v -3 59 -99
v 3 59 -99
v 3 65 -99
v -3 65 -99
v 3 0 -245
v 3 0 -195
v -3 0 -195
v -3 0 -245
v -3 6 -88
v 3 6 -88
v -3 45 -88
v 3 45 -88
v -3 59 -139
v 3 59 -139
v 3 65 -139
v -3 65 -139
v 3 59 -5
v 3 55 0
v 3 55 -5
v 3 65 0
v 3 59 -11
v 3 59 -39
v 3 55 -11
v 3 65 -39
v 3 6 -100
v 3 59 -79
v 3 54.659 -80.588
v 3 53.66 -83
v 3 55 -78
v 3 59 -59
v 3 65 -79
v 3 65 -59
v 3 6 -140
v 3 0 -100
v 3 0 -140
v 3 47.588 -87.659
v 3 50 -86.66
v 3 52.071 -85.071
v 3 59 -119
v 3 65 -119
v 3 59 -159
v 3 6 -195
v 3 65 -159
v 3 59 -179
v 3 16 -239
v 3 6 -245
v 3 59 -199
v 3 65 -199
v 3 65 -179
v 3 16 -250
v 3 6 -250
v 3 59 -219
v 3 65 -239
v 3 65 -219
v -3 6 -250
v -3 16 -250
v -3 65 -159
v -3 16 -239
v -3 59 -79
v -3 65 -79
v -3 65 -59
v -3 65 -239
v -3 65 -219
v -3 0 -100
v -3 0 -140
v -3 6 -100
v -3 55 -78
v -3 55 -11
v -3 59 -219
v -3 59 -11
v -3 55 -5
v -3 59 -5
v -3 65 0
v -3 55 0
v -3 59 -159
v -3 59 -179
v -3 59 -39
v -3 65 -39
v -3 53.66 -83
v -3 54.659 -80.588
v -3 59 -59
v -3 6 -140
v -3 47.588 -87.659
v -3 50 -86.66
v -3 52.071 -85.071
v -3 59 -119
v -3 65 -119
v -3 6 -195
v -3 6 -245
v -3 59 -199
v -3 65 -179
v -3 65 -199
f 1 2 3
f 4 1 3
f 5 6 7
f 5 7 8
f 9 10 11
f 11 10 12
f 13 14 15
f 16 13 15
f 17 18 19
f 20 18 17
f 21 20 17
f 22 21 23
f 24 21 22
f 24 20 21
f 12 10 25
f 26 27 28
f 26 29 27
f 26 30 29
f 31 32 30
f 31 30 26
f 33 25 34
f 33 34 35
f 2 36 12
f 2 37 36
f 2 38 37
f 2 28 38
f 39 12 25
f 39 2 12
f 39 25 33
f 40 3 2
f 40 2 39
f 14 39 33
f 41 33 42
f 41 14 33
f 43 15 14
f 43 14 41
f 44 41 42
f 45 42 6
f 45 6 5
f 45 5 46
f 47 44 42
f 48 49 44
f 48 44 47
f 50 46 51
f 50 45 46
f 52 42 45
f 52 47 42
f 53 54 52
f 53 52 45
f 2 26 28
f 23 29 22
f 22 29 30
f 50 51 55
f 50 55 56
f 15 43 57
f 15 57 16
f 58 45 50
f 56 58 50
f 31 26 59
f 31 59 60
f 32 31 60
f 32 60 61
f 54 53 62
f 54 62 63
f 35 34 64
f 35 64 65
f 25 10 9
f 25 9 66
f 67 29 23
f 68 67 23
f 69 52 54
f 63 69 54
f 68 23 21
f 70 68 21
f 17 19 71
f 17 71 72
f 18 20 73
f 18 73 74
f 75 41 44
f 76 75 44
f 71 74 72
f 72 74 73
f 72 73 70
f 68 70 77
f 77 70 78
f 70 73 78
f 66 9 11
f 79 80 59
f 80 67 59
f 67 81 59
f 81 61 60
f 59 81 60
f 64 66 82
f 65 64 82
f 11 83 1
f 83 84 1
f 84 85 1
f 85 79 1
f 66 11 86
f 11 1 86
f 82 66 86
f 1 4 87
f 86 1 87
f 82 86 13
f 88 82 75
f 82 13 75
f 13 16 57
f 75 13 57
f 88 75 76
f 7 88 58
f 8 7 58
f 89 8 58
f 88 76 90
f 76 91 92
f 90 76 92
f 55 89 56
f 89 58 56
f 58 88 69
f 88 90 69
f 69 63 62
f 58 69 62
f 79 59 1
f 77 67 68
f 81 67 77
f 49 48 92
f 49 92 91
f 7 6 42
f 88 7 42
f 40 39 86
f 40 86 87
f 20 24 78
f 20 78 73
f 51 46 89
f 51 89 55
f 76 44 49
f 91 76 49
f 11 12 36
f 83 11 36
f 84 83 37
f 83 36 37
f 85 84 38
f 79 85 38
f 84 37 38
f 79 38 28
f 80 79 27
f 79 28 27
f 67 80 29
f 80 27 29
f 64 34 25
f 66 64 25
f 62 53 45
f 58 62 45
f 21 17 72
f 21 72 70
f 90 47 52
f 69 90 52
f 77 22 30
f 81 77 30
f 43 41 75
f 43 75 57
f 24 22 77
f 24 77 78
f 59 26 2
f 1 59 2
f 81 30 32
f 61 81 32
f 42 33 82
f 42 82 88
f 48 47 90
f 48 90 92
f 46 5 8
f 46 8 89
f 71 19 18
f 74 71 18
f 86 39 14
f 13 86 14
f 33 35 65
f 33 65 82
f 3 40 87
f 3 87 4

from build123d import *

# Parameters (mm, degrees)
BOSS_EXTRUDE1_DEPTH = 3
CUT_EXTRUDE1_DEPTH  = 6
SKETCH4_W           = 12
SKETCH4_H           = 6
SKETCH4_W_2         = 55
SKETCH4_W_3         = 5
SKETCH4_W_4         = 6
SKETCH4_H_2         = 4
CUT_EXTRUDE2_DEPTH  = 6
CUT_EXTRUDE3_REACH  = 8
SKETCH5_W           = 20
SKETCH5_H           = 6


with BuildPart() as part:
    # Sketch1 → Boss-Extrude1 (new body, symmetric)
    with BuildSketch(Plane(origin=(0, 0, 0), x_dir=(0, 0, -1), z_dir=(1, 0, 0))):
        Polygon((0, 0), (250, 0), (250, 65), (60, 65), (0, 65), align=None)
    extrude(amount=BOSS_EXTRUDE1_DEPTH, both=True)

    # Sketch3 → Cut-Extrude1 (cut)
    with BuildSketch(Plane(origin=(3, 0, 0), x_dir=(0, 0, -1), z_dir=(1, 0, 0))):
        with BuildLine():
            Line((0, 0), (88, 0))
            Line((88, 0), (88, 45))
            ThreePointArc((88, 45), (85.071067812, 52.071067812), (78, 55))
            Line((78, 55), (0, 55))
            Line((0, 55), (0, 0))
        make_face()
    extrude(amount=-CUT_EXTRUDE1_DEPTH, mode=Mode.SUBTRACT)

    # Sketch4 → Cut-Extrude2 (cut)
    with BuildSketch(Plane(origin=(3, 0, 0), x_dir=(0, 0, -1), z_dir=(1, 0, 0))):
        with Locations((94, 3)):
            Rectangle(SKETCH4_W, SKETCH4_H)
        with Locations((167.5, 3)):
            Rectangle(SKETCH4_W_2, SKETCH4_H)
        with Locations((247.5, 3)):
            Rectangle(SKETCH4_W_3, SKETCH4_H)
        Polygon((245, 16), (250, 16), (250, 65), (239, 65), (239, 16), align=None)
        with Locations((8, 57)):
            Rectangle(SKETCH4_W_4, SKETCH4_H_2)
    extrude(amount=-CUT_EXTRUDE2_DEPTH, mode=Mode.SUBTRACT)

    # Sketch5 → Cut-Extrude3 (cut, up to next)
    with BuildSketch(Plane(origin=(3, 0, 0), x_dir=(0, 0, -1), z_dir=(1, 0, 0)), mode=Mode.PRIVATE) as cut_extrude3_sk1:
        with Locations((169, 62)):
            Rectangle(SKETCH5_W, SKETCH5_H)
    cut_extrude3_tool1 = extrude(cut_extrude3_sk1.sketch, amount=-CUT_EXTRUDE3_REACH, mode=Mode.PRIVATE) & part.part
    add(cut_extrude3_tool1.solids().sort_by_distance((3, 62, -169))[0], mode=Mode.SUBTRACT)
    # Sketch5 → Cut-Extrude3 (cut, up to next)
    with BuildSketch(Plane(origin=(3, 0, 0), x_dir=(0, 0, -1), z_dir=(1, 0, 0)), mode=Mode.PRIVATE) as cut_extrude3_sk2:
        with Locations((209, 62)):
            Rectangle(SKETCH5_W, SKETCH5_H)
    cut_extrude3_tool2 = extrude(cut_extrude3_sk2.sketch, amount=-CUT_EXTRUDE3_REACH, mode=Mode.PRIVATE) & part.part
    add(cut_extrude3_tool2.solids().sort_by_distance((3, 62, -209))[0], mode=Mode.SUBTRACT)
    # Sketch5 → Cut-Extrude3 (cut, up to next)
    with BuildSketch(Plane(origin=(3, 0, 0), x_dir=(0, 0, -1), z_dir=(1, 0, 0)), mode=Mode.PRIVATE) as cut_extrude3_sk3:
        with Locations((129, 62)):
            Rectangle(SKETCH5_W, SKETCH5_H)
    cut_extrude3_tool3 = extrude(cut_extrude3_sk3.sketch, amount=-CUT_EXTRUDE3_REACH, mode=Mode.PRIVATE) & part.part
    add(cut_extrude3_tool3.solids().sort_by_distance((3, 62, -129))[0], mode=Mode.SUBTRACT)
    # Sketch5 → Cut-Extrude3 (cut, up to next)
    with BuildSketch(Plane(origin=(3, 0, 0), x_dir=(0, 0, -1), z_dir=(1, 0, 0)), mode=Mode.PRIVATE) as cut_extrude3_sk4:
        with Locations((89, 62)):
            Rectangle(SKETCH5_W, SKETCH5_H)
    cut_extrude3_tool4 = extrude(cut_extrude3_sk4.sketch, amount=-CUT_EXTRUDE3_REACH, mode=Mode.PRIVATE) & part.part
    add(cut_extrude3_tool4.solids().sort_by_distance((3, 62, -89))[0], mode=Mode.SUBTRACT)
    # Sketch5 → Cut-Extrude3 (cut, up to next)
    with BuildSketch(Plane(origin=(3, 0, 0), x_dir=(0, 0, -1), z_dir=(1, 0, 0)), mode=Mode.PRIVATE) as cut_extrude3_sk5:
        with Locations((49, 62)):
            Rectangle(SKETCH5_W, SKETCH5_H)
    cut_extrude3_tool5 = extrude(cut_extrude3_sk5.sketch, amount=-CUT_EXTRUDE3_REACH, mode=Mode.PRIVATE) & part.part
    add(cut_extrude3_tool5.solids().sort_by_distance((3, 62, -49))[0], mode=Mode.SUBTRACT)


solid = part.part
